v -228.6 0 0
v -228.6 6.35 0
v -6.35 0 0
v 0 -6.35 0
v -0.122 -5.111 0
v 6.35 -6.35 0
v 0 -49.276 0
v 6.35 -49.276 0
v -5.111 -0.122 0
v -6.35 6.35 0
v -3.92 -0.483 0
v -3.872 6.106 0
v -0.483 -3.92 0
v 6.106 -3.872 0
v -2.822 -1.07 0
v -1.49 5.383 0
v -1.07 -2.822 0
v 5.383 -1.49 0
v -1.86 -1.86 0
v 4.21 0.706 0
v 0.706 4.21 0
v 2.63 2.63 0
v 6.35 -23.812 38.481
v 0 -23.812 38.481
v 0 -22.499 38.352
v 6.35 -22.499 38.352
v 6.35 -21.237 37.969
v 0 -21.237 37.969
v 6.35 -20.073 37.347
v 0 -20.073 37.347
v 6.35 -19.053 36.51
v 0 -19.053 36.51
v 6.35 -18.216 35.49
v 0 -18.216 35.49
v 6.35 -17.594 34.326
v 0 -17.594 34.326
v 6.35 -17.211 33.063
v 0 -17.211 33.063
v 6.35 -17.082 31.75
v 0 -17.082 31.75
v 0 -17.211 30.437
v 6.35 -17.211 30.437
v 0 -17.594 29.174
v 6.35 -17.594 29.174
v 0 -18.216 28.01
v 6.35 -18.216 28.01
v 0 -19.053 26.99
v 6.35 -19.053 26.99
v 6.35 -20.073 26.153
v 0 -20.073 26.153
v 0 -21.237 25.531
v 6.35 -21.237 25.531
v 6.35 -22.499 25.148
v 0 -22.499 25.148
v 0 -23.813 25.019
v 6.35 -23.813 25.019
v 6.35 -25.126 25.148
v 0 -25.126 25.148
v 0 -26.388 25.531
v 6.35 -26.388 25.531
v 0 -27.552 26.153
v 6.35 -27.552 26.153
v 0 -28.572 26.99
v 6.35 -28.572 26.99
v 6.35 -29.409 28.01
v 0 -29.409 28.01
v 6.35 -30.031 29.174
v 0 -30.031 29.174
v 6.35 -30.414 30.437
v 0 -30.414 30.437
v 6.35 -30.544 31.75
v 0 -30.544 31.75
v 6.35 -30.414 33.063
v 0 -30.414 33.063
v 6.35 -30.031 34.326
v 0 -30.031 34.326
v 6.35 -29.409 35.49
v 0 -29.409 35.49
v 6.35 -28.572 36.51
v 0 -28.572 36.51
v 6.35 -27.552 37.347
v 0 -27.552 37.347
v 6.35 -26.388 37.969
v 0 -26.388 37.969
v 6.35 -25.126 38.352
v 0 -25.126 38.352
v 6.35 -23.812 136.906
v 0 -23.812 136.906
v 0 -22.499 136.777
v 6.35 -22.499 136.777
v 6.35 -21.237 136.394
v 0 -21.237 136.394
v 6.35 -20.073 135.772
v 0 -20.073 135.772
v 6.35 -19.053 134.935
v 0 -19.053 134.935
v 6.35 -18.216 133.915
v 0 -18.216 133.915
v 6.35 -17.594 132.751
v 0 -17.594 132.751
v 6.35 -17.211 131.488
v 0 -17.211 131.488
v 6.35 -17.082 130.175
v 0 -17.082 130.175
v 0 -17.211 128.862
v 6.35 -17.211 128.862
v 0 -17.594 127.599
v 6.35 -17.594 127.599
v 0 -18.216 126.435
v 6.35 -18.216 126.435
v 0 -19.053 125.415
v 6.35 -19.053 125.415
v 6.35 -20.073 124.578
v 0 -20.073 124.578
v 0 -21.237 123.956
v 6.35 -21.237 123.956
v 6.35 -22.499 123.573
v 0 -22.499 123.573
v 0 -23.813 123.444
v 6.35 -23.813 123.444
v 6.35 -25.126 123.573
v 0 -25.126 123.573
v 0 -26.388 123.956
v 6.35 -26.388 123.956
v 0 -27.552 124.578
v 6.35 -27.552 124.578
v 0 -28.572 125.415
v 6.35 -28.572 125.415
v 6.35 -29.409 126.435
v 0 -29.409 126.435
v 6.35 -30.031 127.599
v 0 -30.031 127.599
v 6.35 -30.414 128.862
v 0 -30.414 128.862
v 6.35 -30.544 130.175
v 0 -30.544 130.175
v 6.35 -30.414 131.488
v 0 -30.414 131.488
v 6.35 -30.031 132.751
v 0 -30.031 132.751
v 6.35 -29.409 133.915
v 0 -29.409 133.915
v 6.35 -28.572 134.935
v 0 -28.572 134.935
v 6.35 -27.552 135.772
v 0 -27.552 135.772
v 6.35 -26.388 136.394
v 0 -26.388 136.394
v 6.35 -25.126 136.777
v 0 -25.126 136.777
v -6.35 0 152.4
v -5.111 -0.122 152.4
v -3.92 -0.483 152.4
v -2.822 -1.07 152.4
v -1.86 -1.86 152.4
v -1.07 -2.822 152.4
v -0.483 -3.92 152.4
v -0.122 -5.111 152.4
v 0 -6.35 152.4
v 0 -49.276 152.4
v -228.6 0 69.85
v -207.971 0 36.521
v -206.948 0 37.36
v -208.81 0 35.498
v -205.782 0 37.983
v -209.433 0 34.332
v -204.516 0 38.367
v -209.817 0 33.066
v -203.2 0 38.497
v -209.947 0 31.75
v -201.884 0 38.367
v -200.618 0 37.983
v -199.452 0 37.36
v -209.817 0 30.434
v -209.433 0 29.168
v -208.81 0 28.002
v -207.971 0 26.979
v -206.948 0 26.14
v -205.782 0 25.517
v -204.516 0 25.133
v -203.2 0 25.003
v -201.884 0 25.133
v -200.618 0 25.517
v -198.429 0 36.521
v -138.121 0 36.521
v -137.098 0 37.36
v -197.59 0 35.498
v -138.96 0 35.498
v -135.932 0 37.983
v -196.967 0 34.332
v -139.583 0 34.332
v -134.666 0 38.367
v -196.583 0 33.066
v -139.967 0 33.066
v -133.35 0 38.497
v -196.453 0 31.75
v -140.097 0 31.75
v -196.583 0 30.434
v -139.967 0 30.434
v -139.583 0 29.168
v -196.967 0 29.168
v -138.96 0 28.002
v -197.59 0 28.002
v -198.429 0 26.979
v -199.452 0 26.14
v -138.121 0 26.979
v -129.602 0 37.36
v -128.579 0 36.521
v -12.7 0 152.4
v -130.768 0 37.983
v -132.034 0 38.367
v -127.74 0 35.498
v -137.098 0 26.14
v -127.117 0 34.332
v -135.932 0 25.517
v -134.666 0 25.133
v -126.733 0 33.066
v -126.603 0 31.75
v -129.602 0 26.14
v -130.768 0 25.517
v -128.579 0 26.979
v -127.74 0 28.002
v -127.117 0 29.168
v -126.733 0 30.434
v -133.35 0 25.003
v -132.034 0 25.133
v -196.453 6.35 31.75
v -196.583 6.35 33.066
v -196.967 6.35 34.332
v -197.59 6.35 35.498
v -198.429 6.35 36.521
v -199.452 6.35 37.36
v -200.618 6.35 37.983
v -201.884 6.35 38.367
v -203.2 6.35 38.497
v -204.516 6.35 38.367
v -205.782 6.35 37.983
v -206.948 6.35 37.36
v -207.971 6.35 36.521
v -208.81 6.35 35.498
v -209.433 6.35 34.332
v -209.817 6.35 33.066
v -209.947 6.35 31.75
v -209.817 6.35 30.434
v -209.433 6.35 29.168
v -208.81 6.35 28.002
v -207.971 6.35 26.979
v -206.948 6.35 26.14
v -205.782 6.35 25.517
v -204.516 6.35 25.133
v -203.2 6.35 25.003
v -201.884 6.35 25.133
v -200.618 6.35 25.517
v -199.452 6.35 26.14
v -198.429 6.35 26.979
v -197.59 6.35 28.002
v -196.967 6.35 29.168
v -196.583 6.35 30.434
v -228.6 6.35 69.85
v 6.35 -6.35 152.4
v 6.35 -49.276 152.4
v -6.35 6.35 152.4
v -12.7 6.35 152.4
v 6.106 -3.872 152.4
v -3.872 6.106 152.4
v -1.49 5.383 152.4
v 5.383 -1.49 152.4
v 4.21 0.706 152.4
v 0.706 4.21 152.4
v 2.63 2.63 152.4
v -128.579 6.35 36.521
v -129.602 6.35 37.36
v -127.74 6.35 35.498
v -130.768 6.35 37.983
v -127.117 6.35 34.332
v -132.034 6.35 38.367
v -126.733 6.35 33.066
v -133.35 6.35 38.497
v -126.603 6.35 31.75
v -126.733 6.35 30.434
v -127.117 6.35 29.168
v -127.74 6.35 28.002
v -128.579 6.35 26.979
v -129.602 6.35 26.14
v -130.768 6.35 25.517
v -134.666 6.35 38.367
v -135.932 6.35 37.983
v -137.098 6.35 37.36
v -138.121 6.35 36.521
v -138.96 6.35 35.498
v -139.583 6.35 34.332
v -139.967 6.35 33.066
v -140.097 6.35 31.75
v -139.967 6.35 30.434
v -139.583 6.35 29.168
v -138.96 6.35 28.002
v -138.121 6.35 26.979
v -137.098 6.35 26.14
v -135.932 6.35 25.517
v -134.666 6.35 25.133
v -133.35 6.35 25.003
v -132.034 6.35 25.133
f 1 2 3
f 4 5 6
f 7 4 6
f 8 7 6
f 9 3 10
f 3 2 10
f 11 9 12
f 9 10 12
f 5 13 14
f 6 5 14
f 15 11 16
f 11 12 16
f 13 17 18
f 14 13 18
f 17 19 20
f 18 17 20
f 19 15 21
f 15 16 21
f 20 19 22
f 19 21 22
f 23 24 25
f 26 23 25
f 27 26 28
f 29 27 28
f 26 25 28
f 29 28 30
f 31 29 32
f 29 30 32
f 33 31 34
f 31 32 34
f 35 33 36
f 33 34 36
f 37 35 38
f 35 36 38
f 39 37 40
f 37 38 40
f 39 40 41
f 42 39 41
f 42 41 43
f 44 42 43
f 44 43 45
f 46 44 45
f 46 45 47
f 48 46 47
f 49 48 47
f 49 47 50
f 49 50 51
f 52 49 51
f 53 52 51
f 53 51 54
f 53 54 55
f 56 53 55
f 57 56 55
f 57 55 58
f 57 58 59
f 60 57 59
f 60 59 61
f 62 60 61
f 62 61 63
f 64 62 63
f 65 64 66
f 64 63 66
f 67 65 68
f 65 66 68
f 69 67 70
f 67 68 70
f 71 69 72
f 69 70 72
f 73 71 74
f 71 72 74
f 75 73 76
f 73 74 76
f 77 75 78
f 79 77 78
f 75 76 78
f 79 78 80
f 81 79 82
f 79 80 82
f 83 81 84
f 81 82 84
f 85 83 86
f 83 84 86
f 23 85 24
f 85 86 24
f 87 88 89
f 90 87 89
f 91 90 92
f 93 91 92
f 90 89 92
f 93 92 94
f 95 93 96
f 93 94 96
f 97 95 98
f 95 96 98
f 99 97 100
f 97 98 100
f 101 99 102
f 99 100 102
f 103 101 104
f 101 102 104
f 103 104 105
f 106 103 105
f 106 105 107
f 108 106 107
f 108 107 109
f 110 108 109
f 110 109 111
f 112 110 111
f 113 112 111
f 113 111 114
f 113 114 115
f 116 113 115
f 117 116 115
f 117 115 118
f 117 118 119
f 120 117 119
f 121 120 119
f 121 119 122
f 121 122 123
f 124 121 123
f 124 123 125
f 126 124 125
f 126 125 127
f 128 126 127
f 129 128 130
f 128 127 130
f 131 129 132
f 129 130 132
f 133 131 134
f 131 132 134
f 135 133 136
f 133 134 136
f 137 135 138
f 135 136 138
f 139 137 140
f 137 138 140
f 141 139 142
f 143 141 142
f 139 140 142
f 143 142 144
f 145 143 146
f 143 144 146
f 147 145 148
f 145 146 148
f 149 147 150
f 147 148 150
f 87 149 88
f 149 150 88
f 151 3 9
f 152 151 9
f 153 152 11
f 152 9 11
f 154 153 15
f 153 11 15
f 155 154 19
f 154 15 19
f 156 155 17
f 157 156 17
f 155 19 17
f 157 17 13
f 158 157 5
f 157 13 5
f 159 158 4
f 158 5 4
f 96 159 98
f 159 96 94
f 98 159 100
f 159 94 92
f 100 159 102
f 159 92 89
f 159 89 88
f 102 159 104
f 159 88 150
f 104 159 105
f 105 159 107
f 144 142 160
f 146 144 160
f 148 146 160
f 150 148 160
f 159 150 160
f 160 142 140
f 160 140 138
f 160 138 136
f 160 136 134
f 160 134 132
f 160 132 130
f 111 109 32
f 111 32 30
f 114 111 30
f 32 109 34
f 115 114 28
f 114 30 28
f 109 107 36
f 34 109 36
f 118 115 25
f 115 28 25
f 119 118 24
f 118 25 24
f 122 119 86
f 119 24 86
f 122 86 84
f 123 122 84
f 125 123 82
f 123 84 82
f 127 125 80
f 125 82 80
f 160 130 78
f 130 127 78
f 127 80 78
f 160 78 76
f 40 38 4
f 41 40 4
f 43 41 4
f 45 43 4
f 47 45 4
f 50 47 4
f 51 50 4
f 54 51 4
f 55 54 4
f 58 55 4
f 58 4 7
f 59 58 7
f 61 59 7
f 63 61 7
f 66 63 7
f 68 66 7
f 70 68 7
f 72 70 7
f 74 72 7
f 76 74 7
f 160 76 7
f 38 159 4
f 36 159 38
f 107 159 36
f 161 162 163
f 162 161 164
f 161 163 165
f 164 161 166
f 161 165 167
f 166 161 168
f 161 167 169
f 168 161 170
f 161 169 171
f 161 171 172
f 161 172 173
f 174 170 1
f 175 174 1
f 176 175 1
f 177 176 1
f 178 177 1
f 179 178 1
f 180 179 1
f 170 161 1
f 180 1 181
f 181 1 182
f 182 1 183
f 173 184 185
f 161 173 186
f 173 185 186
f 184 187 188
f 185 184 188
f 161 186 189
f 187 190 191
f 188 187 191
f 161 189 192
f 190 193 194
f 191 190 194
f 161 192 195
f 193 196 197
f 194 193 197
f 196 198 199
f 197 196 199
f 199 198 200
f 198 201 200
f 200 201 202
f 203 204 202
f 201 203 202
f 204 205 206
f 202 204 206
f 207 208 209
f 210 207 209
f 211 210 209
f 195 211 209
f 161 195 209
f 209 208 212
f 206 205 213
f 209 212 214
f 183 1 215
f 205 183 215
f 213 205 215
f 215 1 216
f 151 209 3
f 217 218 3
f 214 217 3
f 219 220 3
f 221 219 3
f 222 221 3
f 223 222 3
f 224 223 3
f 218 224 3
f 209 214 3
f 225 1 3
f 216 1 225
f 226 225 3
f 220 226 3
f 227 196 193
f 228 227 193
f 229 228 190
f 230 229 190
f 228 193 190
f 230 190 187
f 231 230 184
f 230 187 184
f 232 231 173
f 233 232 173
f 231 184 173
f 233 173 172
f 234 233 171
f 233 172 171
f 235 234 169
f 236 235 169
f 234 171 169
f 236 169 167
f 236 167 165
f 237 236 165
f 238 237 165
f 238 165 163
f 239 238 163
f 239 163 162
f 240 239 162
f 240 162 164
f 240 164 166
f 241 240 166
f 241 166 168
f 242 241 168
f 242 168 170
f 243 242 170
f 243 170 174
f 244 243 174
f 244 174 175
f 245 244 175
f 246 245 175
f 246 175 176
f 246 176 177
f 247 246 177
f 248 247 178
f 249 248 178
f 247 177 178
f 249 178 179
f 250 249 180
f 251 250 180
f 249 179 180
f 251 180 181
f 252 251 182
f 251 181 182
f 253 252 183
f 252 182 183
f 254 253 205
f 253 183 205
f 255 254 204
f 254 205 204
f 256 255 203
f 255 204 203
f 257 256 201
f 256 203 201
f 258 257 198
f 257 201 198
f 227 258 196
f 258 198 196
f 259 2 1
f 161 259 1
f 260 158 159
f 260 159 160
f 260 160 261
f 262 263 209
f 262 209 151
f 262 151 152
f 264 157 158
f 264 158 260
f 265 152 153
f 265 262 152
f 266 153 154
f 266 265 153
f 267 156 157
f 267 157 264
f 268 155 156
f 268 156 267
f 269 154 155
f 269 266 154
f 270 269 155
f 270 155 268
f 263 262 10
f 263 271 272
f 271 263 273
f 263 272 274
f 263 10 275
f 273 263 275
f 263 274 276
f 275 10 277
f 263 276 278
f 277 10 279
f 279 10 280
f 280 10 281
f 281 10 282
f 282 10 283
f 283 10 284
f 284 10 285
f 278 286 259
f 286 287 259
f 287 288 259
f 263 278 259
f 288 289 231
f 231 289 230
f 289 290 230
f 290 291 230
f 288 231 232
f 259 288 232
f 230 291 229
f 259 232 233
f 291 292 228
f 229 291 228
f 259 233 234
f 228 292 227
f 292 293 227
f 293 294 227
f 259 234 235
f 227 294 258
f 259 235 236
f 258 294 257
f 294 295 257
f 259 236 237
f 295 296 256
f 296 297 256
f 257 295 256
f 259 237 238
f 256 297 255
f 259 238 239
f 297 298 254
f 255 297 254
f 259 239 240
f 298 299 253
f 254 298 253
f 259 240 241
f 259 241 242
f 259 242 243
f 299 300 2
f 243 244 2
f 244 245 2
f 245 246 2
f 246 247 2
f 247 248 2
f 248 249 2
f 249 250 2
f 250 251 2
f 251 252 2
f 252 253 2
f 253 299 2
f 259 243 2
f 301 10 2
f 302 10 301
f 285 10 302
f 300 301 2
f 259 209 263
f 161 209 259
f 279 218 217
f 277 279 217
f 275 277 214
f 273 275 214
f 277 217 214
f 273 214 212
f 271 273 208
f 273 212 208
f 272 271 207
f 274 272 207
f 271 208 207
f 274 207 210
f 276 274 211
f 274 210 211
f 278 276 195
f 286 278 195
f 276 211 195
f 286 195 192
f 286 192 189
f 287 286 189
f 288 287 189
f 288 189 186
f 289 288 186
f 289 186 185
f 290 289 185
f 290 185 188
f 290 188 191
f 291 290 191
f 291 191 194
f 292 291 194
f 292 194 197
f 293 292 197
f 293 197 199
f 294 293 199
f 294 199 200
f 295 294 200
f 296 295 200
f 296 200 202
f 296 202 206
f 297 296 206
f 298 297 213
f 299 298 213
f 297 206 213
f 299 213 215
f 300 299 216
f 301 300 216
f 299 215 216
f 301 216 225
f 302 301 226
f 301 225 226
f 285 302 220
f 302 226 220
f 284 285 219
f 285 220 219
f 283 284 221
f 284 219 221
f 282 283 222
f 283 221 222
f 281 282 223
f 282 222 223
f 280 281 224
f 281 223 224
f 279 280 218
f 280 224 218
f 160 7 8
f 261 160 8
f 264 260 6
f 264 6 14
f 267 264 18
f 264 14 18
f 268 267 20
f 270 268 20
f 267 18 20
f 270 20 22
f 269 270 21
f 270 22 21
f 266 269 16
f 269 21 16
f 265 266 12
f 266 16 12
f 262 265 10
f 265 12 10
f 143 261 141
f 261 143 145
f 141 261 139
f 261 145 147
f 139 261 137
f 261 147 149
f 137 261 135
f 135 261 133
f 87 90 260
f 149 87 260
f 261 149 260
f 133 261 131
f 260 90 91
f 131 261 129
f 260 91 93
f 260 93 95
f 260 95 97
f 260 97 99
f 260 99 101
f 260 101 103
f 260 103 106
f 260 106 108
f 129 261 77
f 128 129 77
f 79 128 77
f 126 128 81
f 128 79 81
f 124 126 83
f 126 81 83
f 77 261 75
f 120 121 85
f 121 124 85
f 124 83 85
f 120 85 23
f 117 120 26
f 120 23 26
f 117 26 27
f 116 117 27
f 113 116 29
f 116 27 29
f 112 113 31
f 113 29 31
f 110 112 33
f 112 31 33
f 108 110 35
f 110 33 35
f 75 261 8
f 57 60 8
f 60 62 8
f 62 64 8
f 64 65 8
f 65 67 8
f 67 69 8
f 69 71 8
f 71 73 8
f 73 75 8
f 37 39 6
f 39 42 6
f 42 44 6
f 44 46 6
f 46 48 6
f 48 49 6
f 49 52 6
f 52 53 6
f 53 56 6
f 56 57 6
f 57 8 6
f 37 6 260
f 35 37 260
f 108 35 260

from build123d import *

# Parameters (mm, degrees)
BASE_EXTRUDE_THIN_DEPTH = 152.4
CUT_CNR_DEPTH           = 7.35
CUT_CNR_DEPTH_BACK      = 50.276
HOLE_FLG_D              = 13.462
HOLE_TOP_D              = 13.49375
HOLE_TOP_DEPTH          = 25.4


with BuildPart() as part:
    # Sketch1 → Base-Extrude-Thin (new body)
    with BuildSketch(Plane.XY):
        with BuildLine():
            Line((-228.6, 0), (-6.35, 0))
            ThreePointArc((-6.35, 0), (-1.859871939, -1.859871939), (0, -6.35))
            Line((0, -6.35), (0, -49.276))
            Line((0, -49.276), (6.35, -49.276))
            Line((6.35, -49.276), (6.35, -6.35))
            ThreePointArc((6.35, -6.35), (2.630256121, 2.630256121), (-6.35, 6.35))
            Line((-6.35, 6.35), (-228.6, 6.35))
            Line((-228.6, 6.35), (-228.6, 0))
        make_face()
    extrude(amount=BASE_EXTRUDE_THIN_DEPTH)

    # Sketch2 → Cut cnr (cut, two sides)
    with BuildSketch(Plane(origin=(0, 0, 0), x_dir=(1, 0, 0), z_dir=(0, 1, 0))) as cut_cnr_sk:
        Polygon((-731.624052823, 122.482726079), (-228.6, -69.85), (-12.7, -152.4), (490.324052823, -344.732726079), (105.658600664, -1350.780831726), (-1116.289504982, -883.565379567), align=None)
    extrude(amount=CUT_CNR_DEPTH, mode=Mode.SUBTRACT)
    extrude(cut_cnr_sk.sketch, amount=-CUT_CNR_DEPTH_BACK, mode=Mode.SUBTRACT)

    # Hole-flg (through all)
    with Locations(Plane(origin=(6.35, 0, 0), x_dir=(0, 0, -1), z_dir=(1, 0, 0))):
        with Locations((-130.175, -23.8125), (-31.75, -23.8125)):
            Hole(HOLE_FLG_D / 2)

    # Hole-top
    with Locations(Plane(origin=(0, 6.35, 0), x_dir=(-1, 0, 0), z_dir=(0, 1, 0))):
        with Locations((203.2, 31.75), (133.35, 31.75)):
            Hole(HOLE_TOP_D / 2, depth=HOLE_TOP_DEPTH)


solid = part.part
